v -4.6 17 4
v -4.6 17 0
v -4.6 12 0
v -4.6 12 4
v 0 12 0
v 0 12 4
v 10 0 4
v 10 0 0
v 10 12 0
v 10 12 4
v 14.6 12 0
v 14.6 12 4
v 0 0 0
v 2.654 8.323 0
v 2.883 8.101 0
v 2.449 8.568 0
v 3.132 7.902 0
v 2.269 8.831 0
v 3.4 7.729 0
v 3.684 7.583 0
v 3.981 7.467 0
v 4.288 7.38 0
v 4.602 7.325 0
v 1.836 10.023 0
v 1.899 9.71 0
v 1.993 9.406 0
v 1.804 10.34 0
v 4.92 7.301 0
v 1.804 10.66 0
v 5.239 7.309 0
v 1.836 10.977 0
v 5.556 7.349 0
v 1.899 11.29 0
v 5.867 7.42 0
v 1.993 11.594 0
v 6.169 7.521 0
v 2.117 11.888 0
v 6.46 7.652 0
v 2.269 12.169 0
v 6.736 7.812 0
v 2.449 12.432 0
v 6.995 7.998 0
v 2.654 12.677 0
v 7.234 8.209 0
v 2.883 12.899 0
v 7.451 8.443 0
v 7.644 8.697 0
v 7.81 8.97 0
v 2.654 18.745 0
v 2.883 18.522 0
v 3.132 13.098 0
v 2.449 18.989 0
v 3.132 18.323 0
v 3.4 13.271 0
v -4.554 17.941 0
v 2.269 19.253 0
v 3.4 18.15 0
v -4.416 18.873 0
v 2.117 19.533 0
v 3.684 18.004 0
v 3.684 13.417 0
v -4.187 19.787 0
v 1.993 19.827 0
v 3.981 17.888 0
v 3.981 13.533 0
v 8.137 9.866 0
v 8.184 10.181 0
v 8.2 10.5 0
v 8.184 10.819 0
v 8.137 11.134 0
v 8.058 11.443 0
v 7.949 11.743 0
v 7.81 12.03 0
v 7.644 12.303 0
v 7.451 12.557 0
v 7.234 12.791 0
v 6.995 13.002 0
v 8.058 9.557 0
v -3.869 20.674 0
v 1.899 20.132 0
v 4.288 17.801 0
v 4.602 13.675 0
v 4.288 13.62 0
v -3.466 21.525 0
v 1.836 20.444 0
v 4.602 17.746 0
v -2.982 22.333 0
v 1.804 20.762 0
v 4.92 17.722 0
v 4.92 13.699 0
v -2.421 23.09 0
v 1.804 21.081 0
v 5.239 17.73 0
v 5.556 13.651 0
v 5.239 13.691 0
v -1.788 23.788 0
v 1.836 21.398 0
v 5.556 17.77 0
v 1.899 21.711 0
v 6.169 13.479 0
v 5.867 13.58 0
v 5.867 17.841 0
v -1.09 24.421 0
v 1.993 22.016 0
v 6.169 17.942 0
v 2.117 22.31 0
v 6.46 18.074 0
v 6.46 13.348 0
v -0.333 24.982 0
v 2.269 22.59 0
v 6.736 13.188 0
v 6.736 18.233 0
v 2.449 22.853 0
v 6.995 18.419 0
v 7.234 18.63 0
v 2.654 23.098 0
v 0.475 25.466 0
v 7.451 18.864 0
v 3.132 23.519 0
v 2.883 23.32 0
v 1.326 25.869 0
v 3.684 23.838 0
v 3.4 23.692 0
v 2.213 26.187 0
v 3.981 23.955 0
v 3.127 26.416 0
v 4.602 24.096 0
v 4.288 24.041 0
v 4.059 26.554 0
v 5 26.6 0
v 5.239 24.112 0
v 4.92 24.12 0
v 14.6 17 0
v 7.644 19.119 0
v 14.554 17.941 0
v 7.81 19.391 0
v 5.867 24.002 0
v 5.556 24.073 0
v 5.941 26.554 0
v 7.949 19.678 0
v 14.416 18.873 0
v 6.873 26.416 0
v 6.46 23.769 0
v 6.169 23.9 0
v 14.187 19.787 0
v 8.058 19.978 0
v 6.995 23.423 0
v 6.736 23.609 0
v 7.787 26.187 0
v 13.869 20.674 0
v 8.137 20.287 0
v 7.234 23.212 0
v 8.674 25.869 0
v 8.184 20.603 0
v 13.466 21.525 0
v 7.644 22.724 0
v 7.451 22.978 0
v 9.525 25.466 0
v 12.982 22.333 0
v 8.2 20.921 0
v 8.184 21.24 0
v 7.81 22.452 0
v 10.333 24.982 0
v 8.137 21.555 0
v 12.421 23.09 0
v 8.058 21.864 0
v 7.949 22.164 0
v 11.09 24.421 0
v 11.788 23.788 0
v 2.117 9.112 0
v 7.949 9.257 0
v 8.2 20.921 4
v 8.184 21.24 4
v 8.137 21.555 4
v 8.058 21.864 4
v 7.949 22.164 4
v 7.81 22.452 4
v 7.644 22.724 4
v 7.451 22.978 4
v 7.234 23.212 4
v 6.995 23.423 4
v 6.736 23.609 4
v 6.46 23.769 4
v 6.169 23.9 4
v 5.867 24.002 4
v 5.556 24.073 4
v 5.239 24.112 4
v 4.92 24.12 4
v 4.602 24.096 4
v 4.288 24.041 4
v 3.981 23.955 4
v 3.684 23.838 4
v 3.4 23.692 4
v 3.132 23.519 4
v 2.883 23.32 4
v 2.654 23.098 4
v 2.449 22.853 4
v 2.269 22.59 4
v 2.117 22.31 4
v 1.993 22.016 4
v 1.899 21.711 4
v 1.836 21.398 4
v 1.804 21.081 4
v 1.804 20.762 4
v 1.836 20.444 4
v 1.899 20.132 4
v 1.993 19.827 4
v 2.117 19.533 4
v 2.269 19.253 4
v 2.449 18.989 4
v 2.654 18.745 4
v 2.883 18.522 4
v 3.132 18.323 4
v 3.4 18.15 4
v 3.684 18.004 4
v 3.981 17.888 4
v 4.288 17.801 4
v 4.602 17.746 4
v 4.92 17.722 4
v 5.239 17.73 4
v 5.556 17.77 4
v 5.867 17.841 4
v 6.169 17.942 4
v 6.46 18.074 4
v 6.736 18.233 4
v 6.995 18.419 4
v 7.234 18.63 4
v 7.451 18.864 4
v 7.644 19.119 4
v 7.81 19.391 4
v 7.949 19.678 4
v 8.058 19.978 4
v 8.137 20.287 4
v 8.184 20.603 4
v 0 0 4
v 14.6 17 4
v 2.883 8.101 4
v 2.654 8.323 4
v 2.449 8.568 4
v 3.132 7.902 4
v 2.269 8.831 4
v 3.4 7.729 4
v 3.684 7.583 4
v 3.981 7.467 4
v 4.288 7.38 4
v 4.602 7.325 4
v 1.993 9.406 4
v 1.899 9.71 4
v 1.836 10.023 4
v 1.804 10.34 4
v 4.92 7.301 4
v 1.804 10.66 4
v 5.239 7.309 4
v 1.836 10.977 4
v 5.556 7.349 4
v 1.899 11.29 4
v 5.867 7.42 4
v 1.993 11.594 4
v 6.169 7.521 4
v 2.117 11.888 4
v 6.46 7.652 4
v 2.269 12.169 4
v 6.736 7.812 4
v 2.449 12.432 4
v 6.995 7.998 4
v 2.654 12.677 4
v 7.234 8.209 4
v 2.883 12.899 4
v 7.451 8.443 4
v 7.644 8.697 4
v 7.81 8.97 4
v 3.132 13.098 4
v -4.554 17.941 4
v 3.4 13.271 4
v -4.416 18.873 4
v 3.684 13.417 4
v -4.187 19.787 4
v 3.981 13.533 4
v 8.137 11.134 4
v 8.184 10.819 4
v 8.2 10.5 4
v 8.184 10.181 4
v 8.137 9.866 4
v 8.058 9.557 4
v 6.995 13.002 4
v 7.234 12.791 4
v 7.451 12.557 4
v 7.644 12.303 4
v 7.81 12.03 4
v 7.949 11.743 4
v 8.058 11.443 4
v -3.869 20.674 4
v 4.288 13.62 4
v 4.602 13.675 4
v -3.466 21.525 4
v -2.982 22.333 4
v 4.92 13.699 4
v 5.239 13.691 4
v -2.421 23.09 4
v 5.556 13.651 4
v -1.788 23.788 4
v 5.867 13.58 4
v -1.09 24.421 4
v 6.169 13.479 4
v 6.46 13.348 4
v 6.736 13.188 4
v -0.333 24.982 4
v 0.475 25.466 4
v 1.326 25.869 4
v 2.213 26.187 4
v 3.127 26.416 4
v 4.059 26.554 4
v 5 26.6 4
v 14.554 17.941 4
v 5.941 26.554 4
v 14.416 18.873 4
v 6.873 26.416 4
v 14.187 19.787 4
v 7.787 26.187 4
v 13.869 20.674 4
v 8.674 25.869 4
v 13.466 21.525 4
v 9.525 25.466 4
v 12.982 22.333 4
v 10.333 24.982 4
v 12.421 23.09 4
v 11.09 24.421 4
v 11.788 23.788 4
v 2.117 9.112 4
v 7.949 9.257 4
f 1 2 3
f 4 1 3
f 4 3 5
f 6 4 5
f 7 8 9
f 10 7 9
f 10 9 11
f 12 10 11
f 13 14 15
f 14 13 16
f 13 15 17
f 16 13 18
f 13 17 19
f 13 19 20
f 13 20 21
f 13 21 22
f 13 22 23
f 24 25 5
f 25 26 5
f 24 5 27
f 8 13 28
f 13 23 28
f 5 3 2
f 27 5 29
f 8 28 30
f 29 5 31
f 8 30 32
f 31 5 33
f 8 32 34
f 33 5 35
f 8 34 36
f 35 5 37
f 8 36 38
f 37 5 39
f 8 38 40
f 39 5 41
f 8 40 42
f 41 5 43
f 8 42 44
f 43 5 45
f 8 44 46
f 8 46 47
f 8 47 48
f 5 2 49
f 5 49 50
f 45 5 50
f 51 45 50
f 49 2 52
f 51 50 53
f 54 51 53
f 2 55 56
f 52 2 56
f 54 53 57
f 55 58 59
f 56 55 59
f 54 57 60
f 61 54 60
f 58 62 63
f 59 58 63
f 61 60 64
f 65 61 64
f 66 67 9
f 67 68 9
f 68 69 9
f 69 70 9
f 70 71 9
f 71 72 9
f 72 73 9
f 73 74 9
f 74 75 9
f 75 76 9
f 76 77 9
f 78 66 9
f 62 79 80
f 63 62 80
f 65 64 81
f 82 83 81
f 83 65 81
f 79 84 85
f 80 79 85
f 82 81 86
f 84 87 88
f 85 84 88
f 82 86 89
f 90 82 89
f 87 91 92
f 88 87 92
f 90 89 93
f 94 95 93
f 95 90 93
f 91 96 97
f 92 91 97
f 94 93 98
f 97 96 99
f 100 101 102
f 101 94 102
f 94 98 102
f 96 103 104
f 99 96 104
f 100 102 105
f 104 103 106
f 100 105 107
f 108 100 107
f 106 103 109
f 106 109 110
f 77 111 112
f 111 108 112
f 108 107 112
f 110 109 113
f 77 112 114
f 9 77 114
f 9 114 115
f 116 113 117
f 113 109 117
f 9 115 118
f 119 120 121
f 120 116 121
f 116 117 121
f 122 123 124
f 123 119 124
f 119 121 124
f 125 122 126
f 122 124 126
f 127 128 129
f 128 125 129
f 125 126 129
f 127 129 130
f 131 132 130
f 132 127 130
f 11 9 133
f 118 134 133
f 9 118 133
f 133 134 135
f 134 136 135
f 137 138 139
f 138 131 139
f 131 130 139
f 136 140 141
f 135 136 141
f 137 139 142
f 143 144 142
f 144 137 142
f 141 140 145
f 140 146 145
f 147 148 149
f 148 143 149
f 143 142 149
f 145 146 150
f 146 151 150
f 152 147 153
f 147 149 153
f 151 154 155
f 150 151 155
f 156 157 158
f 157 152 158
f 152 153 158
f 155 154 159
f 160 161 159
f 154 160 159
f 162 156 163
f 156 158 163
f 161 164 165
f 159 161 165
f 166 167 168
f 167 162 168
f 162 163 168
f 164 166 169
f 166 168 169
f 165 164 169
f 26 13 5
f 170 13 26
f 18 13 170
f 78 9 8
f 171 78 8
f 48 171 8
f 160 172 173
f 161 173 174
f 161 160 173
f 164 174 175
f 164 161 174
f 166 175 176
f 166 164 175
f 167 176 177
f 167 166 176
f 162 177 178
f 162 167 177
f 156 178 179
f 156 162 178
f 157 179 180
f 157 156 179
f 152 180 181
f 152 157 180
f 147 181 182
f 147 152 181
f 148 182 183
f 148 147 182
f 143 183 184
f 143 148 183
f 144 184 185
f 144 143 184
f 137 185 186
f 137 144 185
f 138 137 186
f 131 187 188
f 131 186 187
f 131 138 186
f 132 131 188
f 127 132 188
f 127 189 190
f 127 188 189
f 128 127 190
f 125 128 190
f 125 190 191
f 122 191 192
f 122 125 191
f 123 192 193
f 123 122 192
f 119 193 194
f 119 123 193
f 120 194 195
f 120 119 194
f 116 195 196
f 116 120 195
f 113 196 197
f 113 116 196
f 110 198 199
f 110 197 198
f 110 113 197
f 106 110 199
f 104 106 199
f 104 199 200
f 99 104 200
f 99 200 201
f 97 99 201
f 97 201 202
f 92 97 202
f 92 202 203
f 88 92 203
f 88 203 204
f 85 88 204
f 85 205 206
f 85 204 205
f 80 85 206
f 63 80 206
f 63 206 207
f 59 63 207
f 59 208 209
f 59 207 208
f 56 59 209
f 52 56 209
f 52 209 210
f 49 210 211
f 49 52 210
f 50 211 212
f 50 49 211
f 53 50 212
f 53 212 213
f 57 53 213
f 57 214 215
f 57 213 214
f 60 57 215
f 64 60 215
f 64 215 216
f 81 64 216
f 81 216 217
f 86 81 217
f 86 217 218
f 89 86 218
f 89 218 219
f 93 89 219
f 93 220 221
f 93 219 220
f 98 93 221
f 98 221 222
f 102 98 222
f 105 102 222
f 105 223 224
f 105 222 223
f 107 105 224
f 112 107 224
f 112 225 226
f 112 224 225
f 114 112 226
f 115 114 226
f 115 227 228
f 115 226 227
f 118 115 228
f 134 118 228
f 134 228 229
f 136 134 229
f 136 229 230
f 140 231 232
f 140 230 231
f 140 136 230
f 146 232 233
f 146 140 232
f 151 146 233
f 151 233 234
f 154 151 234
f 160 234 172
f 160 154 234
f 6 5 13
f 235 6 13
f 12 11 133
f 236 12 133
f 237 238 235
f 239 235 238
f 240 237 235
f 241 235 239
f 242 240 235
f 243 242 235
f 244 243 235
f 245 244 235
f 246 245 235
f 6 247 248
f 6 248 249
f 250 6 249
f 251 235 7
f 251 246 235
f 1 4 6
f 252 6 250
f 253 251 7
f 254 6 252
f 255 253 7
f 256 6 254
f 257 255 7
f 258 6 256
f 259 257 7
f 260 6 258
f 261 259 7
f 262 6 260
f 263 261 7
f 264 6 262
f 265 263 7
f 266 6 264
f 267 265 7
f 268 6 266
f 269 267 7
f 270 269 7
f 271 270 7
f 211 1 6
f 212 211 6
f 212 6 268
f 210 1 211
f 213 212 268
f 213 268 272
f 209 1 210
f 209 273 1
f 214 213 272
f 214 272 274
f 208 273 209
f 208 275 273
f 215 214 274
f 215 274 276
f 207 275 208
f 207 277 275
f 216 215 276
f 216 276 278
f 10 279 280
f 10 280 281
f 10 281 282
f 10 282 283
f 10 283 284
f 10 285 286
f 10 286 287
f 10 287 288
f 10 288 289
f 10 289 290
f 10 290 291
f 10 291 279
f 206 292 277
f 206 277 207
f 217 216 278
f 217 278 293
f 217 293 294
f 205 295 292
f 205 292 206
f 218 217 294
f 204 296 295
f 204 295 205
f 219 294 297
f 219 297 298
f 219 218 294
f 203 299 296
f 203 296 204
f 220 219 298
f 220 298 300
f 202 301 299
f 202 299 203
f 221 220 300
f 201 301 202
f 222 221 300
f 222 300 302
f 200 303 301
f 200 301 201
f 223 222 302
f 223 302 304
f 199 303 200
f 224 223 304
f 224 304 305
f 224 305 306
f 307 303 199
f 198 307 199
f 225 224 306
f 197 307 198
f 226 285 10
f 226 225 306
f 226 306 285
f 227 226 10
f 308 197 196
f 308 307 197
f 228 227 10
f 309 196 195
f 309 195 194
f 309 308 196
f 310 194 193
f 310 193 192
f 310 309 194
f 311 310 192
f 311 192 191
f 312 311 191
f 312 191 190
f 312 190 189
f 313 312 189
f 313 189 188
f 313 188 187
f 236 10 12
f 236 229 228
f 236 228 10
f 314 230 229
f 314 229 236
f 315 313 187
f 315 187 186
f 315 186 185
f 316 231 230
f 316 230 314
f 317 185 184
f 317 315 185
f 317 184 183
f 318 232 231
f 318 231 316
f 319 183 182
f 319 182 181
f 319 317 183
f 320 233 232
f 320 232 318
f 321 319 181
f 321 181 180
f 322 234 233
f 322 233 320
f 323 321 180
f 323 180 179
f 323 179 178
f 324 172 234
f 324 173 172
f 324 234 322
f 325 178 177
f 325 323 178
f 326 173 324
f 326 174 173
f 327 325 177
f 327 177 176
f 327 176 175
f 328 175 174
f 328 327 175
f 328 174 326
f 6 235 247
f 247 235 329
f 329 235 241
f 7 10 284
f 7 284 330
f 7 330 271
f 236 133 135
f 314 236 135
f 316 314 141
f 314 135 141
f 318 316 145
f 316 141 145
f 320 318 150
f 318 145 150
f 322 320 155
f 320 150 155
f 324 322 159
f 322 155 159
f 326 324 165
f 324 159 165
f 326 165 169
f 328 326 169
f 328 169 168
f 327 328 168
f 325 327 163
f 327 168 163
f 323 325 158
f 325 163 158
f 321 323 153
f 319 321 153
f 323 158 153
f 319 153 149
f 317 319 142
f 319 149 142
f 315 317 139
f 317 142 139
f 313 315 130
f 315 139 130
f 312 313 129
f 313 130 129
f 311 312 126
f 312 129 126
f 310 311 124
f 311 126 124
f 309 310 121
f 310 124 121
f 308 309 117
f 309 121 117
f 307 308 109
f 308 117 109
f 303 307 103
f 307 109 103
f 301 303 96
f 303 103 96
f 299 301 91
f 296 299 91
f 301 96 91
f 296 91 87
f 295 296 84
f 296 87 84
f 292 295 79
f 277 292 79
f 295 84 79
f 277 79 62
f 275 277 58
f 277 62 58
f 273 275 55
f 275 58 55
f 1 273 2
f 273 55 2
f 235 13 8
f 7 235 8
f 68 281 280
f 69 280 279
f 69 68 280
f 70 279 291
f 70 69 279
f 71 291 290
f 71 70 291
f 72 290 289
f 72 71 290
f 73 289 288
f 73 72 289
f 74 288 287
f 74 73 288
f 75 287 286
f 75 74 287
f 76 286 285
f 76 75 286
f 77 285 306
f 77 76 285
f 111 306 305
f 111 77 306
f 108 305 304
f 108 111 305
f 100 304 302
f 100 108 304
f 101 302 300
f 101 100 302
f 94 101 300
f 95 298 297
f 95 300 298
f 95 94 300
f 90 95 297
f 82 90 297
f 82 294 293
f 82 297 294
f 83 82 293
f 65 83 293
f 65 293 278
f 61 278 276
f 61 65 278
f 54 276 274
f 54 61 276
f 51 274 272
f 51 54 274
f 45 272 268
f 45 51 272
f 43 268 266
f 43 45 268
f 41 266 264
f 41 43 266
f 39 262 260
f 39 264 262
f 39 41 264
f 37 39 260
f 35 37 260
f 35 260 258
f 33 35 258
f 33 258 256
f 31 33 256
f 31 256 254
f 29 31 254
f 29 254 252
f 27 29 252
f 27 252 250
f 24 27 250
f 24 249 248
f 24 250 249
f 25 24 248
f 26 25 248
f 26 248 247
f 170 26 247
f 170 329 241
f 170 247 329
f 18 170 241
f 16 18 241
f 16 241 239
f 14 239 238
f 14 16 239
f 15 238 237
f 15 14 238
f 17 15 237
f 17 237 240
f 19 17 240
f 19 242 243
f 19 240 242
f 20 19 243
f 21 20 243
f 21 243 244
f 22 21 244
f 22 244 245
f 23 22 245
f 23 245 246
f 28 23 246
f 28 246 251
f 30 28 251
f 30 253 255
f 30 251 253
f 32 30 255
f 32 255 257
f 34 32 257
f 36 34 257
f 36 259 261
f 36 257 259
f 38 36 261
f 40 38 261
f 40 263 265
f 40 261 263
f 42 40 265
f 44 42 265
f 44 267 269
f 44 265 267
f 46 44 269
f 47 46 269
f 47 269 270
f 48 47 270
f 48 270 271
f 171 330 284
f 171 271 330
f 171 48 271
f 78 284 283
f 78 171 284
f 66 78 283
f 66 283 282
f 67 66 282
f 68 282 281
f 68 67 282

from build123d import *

# Parameters (mm, degrees)
BOSS_EXTRUDE1_DEPTH = 4
SKETCH2_W           = 2.5
SKETCH2_H           = 4
CUT_EXTRUDE1_DEPTH  = 4
SKETCH3_R           = 3.2
CUT_EXTRUDE2_DEPTH  = 5


with BuildPart() as part:
    # Sketch1 → Boss-Extrude1 (new body)
    with BuildSketch(Plane.XY):
        with BuildLine():
            Line((0, 0), (10, 0))
            Line((10, 0), (10, 4))
            Line((10, 4), (12.5, 4))
            Line((12.5, 4), (12.5, 8))
            Line((12.5, 8), (10, 8))
            Line((10, 8), (10, 12))
            Line((10, 12), (14.6, 12))
            Line((14.6, 12), (14.6, 17))
            ThreePointArc((14.6, 17), (5, 26.6), (-4.6, 17))
            Line((-4.6, 17), (-4.6, 12))
            Line((-4.6, 12), (0, 12))
            Line((0, 12), (0, 8))
            Line((0, 8), (-2.5, 8))
            Line((-2.5, 8), (-2.5, 4))
            Line((-2.5, 4), (0, 4))
            Line((0, 4), (0, 0))
        make_face()
    extrude(amount=BOSS_EXTRUDE1_DEPTH)

    # Sketch2 → Cut-Extrude1 (cut)
    with BuildSketch(Plane.XY.offset(4)):
        with Locations((-1.25, 6)):
            Rectangle(SKETCH2_W, SKETCH2_H)
        with Locations((11.25, 6)):
            Rectangle(SKETCH2_W, SKETCH2_H)
    extrude(amount=-CUT_EXTRUDE1_DEPTH, mode=Mode.SUBTRACT)

    # Sketch3 → Cut-Extrude2 (cut, through all)
    with BuildSketch(Plane.XY):
        with Locations((5, 20.921172359)):
            Circle(SKETCH3_R)
        with Locations((5, 10.5)):
            Circle(SKETCH3_R)
    extrude(amount=CUT_EXTRUDE2_DEPTH, mode=Mode.SUBTRACT)


solid = part.part
